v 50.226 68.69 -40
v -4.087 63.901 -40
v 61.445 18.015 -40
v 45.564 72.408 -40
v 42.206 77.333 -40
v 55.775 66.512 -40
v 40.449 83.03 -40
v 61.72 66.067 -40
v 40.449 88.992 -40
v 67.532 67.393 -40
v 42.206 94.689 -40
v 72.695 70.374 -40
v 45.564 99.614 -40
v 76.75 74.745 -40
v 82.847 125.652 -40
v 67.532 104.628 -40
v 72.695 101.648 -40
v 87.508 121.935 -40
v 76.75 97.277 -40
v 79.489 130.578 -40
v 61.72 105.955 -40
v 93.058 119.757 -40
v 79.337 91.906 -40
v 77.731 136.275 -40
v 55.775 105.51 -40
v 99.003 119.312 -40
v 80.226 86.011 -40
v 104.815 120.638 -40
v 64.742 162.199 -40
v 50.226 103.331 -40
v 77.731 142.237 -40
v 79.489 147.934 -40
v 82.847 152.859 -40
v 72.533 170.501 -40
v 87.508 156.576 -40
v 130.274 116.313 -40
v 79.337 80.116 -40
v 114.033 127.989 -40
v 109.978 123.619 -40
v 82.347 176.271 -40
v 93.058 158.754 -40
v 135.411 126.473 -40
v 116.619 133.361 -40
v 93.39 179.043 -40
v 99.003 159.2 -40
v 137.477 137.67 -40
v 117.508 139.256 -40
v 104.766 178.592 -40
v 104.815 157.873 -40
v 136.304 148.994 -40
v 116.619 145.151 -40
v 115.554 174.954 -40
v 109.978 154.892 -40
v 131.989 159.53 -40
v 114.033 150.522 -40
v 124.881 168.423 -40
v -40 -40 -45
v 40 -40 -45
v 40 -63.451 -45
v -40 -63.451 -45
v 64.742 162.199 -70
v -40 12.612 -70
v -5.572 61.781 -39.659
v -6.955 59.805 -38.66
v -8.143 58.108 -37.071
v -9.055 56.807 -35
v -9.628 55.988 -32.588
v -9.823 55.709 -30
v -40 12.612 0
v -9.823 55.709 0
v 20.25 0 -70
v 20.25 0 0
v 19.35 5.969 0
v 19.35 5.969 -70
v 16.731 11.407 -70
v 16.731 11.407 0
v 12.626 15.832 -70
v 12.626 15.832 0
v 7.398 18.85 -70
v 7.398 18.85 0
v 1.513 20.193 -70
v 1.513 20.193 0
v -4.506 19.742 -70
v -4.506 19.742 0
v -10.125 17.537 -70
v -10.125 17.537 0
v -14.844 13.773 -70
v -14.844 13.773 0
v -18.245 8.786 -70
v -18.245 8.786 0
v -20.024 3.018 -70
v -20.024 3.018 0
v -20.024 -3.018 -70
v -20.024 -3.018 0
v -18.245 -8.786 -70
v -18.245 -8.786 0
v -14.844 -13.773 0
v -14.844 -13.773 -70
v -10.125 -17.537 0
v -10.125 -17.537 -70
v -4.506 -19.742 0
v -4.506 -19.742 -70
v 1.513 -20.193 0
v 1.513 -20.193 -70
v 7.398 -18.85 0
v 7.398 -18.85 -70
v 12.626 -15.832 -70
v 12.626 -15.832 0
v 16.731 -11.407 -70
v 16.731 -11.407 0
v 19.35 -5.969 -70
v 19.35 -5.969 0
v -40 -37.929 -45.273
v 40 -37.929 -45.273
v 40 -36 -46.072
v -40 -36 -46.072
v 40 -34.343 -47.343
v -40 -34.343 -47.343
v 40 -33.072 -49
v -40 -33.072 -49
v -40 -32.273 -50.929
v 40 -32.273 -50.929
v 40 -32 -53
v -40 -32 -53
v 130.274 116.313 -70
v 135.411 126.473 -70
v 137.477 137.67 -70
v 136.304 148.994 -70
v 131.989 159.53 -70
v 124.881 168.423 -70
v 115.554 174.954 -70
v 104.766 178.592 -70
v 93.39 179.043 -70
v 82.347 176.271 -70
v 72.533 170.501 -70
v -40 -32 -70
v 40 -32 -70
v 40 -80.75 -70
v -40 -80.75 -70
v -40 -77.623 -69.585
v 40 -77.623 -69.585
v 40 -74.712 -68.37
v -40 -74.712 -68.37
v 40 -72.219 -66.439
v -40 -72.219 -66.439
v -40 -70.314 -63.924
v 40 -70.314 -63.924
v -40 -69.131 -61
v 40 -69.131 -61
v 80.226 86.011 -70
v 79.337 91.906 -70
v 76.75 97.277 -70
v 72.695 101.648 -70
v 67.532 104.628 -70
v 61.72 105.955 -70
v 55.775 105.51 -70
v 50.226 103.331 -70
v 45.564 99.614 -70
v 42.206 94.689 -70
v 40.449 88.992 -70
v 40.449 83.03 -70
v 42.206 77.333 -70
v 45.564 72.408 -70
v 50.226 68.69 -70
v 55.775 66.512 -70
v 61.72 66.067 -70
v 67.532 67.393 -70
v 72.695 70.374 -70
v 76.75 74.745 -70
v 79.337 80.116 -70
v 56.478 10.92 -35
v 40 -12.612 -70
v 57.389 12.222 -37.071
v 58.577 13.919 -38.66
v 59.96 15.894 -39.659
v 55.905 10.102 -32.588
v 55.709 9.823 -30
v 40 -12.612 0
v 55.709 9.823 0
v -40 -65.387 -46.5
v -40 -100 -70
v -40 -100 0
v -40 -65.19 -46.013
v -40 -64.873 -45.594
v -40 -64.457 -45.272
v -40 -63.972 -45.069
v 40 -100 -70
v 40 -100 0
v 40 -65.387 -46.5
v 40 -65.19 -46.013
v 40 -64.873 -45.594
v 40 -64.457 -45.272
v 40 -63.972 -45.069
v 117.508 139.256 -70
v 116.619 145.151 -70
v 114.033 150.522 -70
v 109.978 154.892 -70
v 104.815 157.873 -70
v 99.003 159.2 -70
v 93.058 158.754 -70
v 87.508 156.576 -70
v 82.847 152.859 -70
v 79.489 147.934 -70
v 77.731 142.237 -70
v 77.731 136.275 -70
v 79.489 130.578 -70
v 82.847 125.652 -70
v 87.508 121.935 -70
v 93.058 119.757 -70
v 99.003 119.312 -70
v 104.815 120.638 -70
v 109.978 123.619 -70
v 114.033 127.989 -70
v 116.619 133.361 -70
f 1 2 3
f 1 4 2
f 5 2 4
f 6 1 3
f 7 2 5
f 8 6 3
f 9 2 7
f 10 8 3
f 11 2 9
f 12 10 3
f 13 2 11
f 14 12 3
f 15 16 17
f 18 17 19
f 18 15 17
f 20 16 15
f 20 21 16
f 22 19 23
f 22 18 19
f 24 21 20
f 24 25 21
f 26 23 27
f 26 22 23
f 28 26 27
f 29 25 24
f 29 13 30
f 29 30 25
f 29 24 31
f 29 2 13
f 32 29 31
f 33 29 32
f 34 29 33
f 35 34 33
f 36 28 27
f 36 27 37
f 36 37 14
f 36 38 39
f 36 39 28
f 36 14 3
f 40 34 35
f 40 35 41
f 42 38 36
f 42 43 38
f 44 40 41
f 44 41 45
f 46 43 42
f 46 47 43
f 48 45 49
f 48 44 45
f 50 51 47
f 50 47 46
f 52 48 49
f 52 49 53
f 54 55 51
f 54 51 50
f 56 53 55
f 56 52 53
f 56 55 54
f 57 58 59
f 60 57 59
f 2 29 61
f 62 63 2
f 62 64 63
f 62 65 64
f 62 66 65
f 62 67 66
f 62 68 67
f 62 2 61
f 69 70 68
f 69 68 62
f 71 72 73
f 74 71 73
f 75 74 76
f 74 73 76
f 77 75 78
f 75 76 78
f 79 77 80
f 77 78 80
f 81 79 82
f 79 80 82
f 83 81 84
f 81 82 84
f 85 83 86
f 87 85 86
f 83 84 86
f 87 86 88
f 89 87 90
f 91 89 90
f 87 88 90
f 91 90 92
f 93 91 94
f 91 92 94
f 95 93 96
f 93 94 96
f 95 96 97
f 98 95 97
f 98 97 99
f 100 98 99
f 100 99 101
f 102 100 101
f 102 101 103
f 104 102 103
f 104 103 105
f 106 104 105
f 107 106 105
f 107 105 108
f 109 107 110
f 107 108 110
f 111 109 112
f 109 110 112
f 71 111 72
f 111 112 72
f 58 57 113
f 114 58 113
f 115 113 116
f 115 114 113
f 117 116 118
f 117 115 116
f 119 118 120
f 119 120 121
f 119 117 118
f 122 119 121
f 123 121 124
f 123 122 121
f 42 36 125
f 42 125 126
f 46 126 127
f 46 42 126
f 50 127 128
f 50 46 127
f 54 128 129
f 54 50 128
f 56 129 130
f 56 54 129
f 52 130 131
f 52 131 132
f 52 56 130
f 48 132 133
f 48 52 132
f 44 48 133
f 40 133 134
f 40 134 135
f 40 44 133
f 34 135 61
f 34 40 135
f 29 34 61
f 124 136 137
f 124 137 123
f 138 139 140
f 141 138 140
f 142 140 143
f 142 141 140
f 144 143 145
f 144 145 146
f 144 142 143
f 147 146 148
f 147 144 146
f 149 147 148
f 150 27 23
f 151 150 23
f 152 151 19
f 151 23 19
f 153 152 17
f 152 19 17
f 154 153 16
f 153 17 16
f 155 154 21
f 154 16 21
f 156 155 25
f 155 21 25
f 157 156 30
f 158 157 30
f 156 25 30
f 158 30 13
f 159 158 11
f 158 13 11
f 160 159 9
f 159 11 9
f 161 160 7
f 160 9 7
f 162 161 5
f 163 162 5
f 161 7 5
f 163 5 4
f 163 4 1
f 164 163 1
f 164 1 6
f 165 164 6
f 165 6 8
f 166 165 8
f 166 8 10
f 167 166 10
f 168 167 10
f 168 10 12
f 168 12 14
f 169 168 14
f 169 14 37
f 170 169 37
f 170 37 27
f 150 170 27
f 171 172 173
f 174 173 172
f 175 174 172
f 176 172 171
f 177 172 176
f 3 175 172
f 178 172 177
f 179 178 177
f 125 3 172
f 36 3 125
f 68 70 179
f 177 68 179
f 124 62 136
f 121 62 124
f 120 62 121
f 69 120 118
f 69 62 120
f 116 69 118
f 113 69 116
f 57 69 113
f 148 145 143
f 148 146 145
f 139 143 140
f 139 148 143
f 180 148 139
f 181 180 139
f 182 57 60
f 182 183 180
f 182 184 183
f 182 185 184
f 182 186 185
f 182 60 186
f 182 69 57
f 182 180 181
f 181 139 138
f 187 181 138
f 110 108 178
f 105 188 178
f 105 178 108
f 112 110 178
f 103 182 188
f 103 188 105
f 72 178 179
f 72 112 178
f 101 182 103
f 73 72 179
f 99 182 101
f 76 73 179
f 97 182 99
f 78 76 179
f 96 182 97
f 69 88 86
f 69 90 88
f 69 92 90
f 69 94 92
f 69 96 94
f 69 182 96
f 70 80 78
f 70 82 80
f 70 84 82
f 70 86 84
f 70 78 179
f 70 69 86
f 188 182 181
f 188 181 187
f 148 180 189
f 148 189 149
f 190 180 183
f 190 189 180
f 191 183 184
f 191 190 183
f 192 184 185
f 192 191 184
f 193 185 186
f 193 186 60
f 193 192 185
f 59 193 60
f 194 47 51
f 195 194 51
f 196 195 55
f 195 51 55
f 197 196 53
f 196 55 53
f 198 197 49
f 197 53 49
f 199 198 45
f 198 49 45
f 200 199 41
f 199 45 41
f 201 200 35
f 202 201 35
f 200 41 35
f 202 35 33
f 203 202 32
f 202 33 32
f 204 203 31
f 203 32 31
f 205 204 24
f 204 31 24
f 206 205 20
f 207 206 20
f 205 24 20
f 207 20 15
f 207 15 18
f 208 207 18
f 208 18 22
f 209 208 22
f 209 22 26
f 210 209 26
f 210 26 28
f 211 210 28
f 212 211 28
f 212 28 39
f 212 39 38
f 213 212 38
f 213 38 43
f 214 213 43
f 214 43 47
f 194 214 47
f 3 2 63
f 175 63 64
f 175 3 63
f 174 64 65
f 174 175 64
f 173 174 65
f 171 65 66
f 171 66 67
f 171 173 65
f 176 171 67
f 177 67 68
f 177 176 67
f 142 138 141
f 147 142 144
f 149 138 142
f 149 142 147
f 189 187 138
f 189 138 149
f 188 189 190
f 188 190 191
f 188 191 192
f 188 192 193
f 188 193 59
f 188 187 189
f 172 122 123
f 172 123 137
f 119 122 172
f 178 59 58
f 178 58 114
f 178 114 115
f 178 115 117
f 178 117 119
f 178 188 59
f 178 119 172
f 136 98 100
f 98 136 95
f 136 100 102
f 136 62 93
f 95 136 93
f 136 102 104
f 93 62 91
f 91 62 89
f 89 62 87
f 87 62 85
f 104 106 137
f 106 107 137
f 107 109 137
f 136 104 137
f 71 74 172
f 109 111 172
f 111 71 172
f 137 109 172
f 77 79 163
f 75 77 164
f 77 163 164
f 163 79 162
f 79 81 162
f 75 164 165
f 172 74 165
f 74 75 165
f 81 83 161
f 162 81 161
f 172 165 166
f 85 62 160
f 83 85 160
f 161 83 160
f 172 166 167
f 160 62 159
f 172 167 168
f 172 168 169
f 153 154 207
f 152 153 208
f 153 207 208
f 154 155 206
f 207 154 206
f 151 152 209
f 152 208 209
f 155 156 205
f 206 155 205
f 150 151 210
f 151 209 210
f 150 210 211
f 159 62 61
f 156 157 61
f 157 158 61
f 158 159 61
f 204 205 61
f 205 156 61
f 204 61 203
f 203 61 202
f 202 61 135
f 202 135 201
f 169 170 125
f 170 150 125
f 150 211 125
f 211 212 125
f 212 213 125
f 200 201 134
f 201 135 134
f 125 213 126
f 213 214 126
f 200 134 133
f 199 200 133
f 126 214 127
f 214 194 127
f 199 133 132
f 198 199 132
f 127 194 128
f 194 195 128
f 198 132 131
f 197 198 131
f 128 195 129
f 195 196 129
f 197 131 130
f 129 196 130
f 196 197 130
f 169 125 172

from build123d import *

# Parameters (mm, degrees)
SKETCH_1_R          = 20.25
SKETCH_1_R_2        = 20
EXTRUDE_1_DEPTH     = 70
CUT_EXTRUDE_1_DEPTH = 40
CUT_EXTRUDE_2_DEPTH = 262.804787716
FILLET_1_R          = 12
FILLET_2_R          = 2
FILLET_3_R          = 8
FILLET_4_R          = 10
SKETCH_5_W          = 70
SKETCH_5_H          = 300
CUT_EXTRUDE_4_DEPTH = 262.804787716


with BuildPart() as part:
    # 草图1 → 凸台-拉伸1 (new body)
    with BuildSketch(Plane.XY):
        with BuildLine():
            Line((64.741912408, 162.198904983), (-40, 12.611951555))
            Line((-40, 12.611951555), (-40, -100))
            Line((-40, -100), (40, -100))
            Line((40, -100), (40, -12.611951555))
            Line((40, -12.611951555), (130.274075951, 116.312790075))
            ThreePointArc((130.274075951, 116.312790075), (120.451051634, 172.021929301), (64.741912408, 162.198904983))
        make_face()
        Circle(SKETCH_1_R, mode=Mode.SUBTRACT)
        with Locations((97.50799418, 139.255847529)):
            Circle(SKETCH_1_R_2, mode=Mode.SUBTRACT)
        with Locations((60.225525817, 86.01096465)):
            Circle(SKETCH_1_R_2, mode=Mode.SUBTRACT)
    extrude(amount=EXTRUDE_1_DEPTH)

    # 草图2 → 切除-拉伸1 (cut)
    with BuildSketch(Plane.XY):
        Polygon((-9.823024318, 55.709139226), (55.709139226, 9.823024318), (170.424426496, 173.653433175), (104.892262953, 219.539548083), align=None)
    extrude(amount=CUT_EXTRUDE_1_DEPTH, mode=Mode.SUBTRACT)

    # 草图3 → 切除-拉伸2 (cut, through all)
    with BuildSketch(Plane.ZY.offset(40)):
        Polygon((70, -32), (45, -32), (45, -65), (70, -71.454972244), align=None)
    extrude(amount=-CUT_EXTRUDE_2_DEPTH, mode=Mode.SUBTRACT)

    # 圆角1
    fillet_1_edges = [part.edges().sort_by_distance(p)[0] for p in [
        (0, -71.454972244, 70),
    ]]
    fillet(fillet_1_edges, radius=FILLET_1_R)

    # 圆角2
    fillet_2_edges = [part.edges().sort_by_distance(p)[0] for p in [
        (0, -65, 45),
    ]]
    fillet(fillet_2_edges, radius=FILLET_2_R)

    # 圆角3
    fillet_3_edges = [part.edges().sort_by_distance(p)[0] for p in [
        (0, -32, 45),
    ]]
    fillet(fillet_3_edges, radius=FILLET_3_R)

    # 圆角4
    fillet_4_edges = [part.edges().sort_by_distance(p)[0] for p in [
        (22.943057454, 32.766081772, 40),
    ]]
    fillet(fillet_4_edges, radius=FILLET_4_R)

    # 镜向1: part across plane


with BuildPart() as part_1:
    add(part.part)
    add(part.part.mirror(Plane(origin=(97.50799418, 139.255847529, 0), x_dir=(1, 0, 0), z_dir=(0, 0, -1))))

    # 草图5 → 切除-拉伸4 (cut, through all)
    with BuildSketch(Plane.ZY.offset(40)):
        with Locations((35, 50)):
            Rectangle(SKETCH_5_W, SKETCH_5_H)
    extrude(amount=-CUT_EXTRUDE_4_DEPTH, mode=Mode.SUBTRACT)


solid = part_1.part
